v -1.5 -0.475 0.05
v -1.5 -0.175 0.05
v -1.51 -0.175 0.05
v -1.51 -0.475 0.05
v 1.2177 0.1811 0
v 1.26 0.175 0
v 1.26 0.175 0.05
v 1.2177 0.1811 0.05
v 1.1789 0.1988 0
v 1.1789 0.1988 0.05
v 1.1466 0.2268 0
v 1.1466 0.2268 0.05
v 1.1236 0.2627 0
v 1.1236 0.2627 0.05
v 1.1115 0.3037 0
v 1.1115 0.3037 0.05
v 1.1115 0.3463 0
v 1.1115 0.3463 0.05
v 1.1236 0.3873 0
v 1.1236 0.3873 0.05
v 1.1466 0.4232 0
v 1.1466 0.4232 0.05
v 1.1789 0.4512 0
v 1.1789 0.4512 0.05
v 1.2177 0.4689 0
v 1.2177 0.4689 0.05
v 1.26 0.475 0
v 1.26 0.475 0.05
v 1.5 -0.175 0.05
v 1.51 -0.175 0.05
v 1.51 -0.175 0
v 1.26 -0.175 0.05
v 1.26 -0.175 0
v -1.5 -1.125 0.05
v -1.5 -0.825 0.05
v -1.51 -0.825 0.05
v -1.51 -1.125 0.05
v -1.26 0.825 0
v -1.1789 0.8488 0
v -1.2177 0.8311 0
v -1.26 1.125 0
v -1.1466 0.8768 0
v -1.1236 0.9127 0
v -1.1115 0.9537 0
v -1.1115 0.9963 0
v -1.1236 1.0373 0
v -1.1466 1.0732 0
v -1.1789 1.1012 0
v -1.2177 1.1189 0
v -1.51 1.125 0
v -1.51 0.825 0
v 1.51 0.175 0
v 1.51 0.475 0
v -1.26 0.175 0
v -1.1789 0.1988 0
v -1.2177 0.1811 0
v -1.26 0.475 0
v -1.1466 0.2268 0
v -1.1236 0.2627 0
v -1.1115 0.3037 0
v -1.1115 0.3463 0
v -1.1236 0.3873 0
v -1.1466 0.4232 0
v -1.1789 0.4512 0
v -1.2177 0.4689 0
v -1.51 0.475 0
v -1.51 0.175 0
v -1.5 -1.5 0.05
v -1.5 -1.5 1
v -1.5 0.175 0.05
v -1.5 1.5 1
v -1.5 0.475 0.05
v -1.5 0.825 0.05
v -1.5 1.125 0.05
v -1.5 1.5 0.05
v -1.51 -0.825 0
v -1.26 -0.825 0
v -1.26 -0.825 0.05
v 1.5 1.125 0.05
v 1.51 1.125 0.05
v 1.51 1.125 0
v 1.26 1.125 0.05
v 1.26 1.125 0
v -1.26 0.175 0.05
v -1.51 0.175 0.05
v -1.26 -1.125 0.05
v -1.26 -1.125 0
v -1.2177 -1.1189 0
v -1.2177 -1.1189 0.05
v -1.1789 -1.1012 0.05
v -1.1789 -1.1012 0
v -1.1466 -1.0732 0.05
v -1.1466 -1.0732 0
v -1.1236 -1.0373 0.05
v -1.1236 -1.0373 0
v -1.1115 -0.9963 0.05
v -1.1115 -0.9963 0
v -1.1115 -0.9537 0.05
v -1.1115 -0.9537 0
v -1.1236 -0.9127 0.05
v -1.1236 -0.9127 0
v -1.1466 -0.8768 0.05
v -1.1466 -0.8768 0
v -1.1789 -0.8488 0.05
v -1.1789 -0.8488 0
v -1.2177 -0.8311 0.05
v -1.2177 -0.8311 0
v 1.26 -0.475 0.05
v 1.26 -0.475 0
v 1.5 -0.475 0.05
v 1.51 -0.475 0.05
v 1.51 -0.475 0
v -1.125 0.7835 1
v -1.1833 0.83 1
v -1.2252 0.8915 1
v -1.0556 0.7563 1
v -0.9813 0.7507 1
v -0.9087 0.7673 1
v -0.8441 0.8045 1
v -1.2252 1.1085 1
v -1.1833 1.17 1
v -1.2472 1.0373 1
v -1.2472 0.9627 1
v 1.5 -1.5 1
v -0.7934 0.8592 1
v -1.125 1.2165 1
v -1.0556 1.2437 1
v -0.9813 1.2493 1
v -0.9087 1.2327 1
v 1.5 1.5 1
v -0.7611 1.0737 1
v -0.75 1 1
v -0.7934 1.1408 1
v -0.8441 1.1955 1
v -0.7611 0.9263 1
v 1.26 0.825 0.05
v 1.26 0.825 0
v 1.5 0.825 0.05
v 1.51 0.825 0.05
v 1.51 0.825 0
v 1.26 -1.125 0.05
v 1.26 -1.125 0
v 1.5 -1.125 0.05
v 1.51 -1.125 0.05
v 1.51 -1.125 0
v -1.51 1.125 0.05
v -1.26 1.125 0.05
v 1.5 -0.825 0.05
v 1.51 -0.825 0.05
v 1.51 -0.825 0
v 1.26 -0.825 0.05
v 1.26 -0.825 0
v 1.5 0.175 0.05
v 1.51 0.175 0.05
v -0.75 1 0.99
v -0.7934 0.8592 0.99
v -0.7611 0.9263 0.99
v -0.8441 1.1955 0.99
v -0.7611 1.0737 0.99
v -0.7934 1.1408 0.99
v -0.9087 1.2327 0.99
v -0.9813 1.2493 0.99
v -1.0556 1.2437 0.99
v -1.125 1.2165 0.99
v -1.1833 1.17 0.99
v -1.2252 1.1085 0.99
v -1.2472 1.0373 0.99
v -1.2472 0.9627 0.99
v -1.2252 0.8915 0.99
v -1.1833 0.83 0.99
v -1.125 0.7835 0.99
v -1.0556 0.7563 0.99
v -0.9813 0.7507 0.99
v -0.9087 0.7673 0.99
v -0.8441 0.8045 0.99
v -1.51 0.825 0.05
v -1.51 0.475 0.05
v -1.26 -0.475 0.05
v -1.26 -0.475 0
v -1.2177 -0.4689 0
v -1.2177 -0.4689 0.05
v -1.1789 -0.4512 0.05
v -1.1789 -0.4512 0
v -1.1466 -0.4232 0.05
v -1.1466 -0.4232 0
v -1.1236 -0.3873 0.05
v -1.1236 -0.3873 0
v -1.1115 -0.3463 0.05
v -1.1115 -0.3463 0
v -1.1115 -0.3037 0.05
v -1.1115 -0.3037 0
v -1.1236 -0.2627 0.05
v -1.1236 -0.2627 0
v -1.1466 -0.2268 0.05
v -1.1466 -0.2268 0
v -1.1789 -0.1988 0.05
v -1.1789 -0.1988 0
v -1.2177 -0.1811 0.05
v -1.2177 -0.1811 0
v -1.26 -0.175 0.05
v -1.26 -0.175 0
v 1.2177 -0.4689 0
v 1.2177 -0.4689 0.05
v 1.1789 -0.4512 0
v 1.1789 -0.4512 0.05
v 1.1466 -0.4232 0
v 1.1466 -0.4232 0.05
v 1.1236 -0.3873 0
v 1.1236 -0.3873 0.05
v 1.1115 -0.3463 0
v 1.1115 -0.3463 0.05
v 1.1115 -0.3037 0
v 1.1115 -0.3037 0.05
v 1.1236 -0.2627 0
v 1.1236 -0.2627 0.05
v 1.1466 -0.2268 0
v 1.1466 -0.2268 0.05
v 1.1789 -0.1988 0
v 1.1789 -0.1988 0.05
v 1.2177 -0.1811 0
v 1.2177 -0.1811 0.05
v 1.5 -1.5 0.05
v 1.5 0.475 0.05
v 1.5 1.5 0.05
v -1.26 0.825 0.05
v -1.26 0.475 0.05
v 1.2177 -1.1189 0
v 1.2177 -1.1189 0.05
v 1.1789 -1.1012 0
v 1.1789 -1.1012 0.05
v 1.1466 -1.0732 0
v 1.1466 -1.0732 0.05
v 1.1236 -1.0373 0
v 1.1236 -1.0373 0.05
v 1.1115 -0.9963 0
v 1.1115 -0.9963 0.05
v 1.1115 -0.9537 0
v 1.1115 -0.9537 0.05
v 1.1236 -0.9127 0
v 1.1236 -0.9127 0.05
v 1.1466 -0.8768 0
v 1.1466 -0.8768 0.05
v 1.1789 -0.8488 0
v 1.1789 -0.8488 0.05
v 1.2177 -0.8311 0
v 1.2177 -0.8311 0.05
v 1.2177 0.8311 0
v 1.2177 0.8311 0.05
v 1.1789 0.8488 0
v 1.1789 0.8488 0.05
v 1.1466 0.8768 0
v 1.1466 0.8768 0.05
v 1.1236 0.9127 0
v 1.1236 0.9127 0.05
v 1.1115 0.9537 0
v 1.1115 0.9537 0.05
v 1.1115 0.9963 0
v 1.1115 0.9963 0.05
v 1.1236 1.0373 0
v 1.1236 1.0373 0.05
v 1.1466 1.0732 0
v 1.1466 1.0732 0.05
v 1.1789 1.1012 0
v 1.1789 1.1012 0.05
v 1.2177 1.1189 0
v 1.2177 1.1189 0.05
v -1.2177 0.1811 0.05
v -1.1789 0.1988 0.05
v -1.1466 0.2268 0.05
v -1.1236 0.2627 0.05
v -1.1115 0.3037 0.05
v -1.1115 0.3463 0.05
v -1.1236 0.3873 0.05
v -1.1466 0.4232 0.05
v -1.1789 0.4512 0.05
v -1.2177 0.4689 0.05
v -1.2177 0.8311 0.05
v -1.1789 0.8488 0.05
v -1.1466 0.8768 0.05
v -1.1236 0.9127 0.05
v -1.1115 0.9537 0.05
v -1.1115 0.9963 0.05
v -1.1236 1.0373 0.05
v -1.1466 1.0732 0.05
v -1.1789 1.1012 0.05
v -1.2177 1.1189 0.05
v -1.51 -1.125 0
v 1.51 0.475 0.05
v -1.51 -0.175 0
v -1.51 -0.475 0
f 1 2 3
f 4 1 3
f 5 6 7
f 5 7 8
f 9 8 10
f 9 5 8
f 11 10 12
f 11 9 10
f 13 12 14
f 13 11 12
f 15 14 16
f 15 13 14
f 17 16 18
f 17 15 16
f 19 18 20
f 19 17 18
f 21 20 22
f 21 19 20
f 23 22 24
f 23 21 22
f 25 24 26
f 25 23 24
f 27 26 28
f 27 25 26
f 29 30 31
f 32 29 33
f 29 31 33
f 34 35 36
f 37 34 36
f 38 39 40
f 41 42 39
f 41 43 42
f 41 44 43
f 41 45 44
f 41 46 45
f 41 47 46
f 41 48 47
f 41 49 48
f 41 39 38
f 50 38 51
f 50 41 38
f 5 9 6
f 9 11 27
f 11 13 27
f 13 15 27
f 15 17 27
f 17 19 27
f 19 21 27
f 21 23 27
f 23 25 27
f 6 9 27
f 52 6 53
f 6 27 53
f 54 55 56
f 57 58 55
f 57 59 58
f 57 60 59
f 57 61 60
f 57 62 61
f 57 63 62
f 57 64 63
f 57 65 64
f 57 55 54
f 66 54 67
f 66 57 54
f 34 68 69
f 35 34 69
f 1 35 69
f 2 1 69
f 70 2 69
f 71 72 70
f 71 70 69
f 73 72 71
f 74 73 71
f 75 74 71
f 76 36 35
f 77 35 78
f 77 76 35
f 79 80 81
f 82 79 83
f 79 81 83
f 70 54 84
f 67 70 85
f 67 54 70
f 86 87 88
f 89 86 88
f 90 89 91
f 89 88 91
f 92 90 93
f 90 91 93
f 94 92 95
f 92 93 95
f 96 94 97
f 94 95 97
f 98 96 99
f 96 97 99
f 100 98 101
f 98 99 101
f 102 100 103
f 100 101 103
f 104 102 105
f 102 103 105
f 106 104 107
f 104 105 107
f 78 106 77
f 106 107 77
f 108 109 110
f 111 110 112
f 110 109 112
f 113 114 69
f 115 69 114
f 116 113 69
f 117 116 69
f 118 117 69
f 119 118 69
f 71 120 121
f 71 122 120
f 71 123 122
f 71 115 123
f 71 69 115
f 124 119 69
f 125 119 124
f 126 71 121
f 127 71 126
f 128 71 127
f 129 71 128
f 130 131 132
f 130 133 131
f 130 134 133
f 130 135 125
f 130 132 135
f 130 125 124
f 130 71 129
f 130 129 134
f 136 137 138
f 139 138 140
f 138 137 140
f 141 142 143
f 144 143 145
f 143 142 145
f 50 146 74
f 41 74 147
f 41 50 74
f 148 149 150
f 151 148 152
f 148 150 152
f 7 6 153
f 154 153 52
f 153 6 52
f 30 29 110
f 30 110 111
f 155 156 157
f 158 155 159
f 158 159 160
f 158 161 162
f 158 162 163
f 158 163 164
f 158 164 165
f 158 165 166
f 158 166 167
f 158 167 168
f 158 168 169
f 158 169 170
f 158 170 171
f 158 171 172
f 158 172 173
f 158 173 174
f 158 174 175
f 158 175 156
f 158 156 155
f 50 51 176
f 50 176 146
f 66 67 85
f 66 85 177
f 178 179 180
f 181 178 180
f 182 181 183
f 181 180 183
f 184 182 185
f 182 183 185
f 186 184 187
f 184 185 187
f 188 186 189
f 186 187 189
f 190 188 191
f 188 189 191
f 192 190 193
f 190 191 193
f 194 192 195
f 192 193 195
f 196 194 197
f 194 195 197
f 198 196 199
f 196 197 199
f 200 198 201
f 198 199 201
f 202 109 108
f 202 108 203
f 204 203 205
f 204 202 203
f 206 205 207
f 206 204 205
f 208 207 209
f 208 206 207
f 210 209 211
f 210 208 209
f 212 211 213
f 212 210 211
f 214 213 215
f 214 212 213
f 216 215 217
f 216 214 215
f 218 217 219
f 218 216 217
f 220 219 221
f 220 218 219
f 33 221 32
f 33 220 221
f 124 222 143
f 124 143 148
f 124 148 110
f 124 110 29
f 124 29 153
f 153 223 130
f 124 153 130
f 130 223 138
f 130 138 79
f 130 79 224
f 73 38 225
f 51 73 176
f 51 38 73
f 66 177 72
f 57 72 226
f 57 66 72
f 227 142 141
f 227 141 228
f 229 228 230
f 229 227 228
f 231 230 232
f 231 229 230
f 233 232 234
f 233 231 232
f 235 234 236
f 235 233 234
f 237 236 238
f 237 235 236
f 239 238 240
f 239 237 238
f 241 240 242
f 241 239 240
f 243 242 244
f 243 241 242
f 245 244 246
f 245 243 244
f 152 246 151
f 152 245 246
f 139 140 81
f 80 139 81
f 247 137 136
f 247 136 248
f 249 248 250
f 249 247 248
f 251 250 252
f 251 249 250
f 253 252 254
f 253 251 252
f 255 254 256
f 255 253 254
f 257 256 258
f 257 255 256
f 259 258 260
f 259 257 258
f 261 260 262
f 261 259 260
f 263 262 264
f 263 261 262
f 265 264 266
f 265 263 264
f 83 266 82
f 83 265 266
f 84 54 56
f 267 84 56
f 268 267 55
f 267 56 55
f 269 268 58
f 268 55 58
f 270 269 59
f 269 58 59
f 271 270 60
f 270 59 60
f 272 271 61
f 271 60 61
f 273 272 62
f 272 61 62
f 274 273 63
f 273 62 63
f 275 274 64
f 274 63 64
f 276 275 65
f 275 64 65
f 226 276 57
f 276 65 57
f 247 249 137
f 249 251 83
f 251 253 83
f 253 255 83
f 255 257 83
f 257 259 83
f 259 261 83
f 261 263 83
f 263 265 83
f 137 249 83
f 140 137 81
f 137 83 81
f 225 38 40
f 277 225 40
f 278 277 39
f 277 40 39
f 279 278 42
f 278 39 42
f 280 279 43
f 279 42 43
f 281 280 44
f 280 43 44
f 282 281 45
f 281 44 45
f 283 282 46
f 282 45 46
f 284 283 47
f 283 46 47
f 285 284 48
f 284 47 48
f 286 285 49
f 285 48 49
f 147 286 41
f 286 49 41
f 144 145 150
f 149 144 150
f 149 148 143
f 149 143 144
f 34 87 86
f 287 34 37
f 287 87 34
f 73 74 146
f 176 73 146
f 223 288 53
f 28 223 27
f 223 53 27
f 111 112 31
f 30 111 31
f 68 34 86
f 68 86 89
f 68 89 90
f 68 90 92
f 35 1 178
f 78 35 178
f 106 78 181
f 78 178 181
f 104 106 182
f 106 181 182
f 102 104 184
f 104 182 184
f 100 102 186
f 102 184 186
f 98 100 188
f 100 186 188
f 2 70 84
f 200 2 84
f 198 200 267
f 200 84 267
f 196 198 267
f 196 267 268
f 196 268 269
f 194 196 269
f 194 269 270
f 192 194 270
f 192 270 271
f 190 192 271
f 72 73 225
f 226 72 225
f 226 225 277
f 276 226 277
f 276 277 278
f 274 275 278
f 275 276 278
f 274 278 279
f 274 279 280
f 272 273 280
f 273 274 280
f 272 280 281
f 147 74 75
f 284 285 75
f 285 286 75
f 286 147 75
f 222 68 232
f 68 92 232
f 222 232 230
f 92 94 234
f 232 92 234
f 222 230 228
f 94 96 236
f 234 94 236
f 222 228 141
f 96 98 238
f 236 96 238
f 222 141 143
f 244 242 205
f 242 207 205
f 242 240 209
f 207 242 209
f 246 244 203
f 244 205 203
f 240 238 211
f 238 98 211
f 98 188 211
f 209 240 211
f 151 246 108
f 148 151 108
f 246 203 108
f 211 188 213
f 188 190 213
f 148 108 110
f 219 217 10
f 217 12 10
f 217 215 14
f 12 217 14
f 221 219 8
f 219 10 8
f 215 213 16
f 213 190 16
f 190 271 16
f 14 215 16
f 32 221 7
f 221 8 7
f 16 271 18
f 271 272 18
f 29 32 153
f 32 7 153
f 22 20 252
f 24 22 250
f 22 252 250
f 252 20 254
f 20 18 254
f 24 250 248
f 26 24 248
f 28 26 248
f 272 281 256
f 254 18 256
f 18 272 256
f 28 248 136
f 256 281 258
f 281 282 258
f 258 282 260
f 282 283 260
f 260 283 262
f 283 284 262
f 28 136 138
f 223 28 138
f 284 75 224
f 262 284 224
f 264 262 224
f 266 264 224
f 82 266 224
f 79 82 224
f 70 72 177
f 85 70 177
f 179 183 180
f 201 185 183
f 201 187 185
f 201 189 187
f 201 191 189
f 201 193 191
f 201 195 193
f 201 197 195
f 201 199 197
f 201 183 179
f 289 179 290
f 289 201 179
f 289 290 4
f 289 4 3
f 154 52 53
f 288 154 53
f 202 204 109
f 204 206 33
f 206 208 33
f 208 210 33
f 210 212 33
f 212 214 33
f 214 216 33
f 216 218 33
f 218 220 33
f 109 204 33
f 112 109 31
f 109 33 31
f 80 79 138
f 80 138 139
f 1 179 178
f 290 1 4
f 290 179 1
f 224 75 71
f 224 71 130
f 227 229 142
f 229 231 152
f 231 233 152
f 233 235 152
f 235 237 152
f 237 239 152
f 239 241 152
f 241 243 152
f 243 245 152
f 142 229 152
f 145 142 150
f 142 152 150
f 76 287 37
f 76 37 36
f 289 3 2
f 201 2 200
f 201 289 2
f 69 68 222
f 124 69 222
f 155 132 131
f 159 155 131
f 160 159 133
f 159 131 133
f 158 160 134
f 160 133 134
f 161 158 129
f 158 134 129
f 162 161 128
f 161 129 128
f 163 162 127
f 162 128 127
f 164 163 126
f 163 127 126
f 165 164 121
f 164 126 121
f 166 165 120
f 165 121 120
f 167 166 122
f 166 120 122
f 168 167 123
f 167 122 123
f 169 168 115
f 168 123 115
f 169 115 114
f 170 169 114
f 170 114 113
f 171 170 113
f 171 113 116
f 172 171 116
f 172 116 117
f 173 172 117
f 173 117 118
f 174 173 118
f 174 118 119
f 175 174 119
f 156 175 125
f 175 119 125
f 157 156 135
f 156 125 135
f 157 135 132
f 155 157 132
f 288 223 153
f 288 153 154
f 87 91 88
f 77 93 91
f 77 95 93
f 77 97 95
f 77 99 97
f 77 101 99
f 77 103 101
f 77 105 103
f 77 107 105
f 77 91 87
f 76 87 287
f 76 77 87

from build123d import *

# Parameters (mm, degrees)
PAD_DEPTH                 = 0.05
SKETCH001_W               = 3
SKETCH001_H               = 3
PAD001_DEPTH              = 0.95
PAD_LINEARPATTERN_2_DEPTH = 0.05
PAD_LINEARPATTERN_3_DEPTH = 0.05
PAD_LINEARPATTERN_4_DEPTH = 0.05
SKETCH002_R               = 0.25
POCKET_DEPTH              = 0.01


with BuildPart() as part:
    # Sketch → Pad (new body)
    with BuildSketch(Plane.XY):
        with BuildLine():
            Line((-1.51, 1.125), (-1.26, 1.125))
            ThreePointArc((-1.26, 0.825), (-1.11, 0.975), (-1.26, 1.125))
            Line((-1.26, 0.825), (-1.51, 0.825))
            Line((-1.51, 0.825), (-1.51, 1.125))
        make_face()
    pad = extrude(amount=PAD_DEPTH)

    # Sketch001 (on Face6 of Pad) → Pad001 (join)
    with BuildSketch(Plane.XY.offset(0.05)):
        Rectangle(SKETCH001_W, SKETCH001_H)
    extrude(amount=PAD001_DEPTH)

    # Sketch LinearPattern 2 → Pad LinearPattern 2 (add)
    with BuildSketch(Plane(origin=(0, -0.65, 0), x_dir=(1, 0, 0), z_dir=(0, 0, 1))):
        with BuildLine():
            Line((-1.51, 1.125), (-1.26, 1.125))
            ThreePointArc((-1.26, 0.825), (-1.11, 0.975), (-1.26, 1.125))
            Line((-1.26, 0.825), (-1.51, 0.825))
            Line((-1.51, 0.825), (-1.51, 1.125))
        make_face()
    pad_linearpattern_2 = extrude(amount=PAD_LINEARPATTERN_2_DEPTH)

    # Sketch LinearPattern 3 → Pad LinearPattern 3 (add)
    with BuildSketch(Plane(origin=(0, -1.3, 0), x_dir=(1, 0, 0), z_dir=(0, 0, 1))):
        with BuildLine():
            Line((-1.51, 1.125), (-1.26, 1.125))
            ThreePointArc((-1.26, 0.825), (-1.11, 0.975), (-1.26, 1.125))
            Line((-1.26, 0.825), (-1.51, 0.825))
            Line((-1.51, 0.825), (-1.51, 1.125))
        make_face()
    pad_linearpattern_3 = extrude(amount=PAD_LINEARPATTERN_3_DEPTH)

    # Sketch LinearPattern 4 → Pad LinearPattern 4 (add)
    with BuildSketch(Plane(origin=(0, -1.95, 0), x_dir=(1, 0, 0), z_dir=(0, 0, 1))):
        with BuildLine():
            Line((-1.51, 1.125), (-1.26, 1.125))
            ThreePointArc((-1.26, 0.825), (-1.11, 0.975), (-1.26, 1.125))
            Line((-1.26, 0.825), (-1.51, 0.825))
            Line((-1.51, 0.825), (-1.51, 1.125))
        make_face()
    pad_linearpattern_4 = extrude(amount=PAD_LINEARPATTERN_4_DEPTH)

    # Mirrored: Pad, Pad LinearPattern 2, Pad LinearPattern 3, Pad LinearPattern 4 across Sketch V_Axis
    add(pad.mirror(Plane(origin=(0, 0, 0), x_dir=(0, 0, 1), z_dir=(1, 0, 0))))
    add(pad_linearpattern_2.mirror(Plane(origin=(0, 0, 0), x_dir=(0, 0, 1), z_dir=(1, 0, 0))))
    add(pad_linearpattern_3.mirror(Plane(origin=(0, 0, 0), x_dir=(0, 0, 1), z_dir=(1, 0, 0))))
    add(pad_linearpattern_4.mirror(Plane(origin=(0, 0, 0), x_dir=(0, 0, 1), z_dir=(1, 0, 0))))

    # Sketch002 (on Face36 of MultiTransform) → Pocket (cut)
    with BuildSketch(Plane.XY.offset(1)):
        with Locations((-1, 1)):
            Circle(SKETCH002_R)
    extrude(amount=-POCKET_DEPTH, mode=Mode.SUBTRACT)


solid = part.part
